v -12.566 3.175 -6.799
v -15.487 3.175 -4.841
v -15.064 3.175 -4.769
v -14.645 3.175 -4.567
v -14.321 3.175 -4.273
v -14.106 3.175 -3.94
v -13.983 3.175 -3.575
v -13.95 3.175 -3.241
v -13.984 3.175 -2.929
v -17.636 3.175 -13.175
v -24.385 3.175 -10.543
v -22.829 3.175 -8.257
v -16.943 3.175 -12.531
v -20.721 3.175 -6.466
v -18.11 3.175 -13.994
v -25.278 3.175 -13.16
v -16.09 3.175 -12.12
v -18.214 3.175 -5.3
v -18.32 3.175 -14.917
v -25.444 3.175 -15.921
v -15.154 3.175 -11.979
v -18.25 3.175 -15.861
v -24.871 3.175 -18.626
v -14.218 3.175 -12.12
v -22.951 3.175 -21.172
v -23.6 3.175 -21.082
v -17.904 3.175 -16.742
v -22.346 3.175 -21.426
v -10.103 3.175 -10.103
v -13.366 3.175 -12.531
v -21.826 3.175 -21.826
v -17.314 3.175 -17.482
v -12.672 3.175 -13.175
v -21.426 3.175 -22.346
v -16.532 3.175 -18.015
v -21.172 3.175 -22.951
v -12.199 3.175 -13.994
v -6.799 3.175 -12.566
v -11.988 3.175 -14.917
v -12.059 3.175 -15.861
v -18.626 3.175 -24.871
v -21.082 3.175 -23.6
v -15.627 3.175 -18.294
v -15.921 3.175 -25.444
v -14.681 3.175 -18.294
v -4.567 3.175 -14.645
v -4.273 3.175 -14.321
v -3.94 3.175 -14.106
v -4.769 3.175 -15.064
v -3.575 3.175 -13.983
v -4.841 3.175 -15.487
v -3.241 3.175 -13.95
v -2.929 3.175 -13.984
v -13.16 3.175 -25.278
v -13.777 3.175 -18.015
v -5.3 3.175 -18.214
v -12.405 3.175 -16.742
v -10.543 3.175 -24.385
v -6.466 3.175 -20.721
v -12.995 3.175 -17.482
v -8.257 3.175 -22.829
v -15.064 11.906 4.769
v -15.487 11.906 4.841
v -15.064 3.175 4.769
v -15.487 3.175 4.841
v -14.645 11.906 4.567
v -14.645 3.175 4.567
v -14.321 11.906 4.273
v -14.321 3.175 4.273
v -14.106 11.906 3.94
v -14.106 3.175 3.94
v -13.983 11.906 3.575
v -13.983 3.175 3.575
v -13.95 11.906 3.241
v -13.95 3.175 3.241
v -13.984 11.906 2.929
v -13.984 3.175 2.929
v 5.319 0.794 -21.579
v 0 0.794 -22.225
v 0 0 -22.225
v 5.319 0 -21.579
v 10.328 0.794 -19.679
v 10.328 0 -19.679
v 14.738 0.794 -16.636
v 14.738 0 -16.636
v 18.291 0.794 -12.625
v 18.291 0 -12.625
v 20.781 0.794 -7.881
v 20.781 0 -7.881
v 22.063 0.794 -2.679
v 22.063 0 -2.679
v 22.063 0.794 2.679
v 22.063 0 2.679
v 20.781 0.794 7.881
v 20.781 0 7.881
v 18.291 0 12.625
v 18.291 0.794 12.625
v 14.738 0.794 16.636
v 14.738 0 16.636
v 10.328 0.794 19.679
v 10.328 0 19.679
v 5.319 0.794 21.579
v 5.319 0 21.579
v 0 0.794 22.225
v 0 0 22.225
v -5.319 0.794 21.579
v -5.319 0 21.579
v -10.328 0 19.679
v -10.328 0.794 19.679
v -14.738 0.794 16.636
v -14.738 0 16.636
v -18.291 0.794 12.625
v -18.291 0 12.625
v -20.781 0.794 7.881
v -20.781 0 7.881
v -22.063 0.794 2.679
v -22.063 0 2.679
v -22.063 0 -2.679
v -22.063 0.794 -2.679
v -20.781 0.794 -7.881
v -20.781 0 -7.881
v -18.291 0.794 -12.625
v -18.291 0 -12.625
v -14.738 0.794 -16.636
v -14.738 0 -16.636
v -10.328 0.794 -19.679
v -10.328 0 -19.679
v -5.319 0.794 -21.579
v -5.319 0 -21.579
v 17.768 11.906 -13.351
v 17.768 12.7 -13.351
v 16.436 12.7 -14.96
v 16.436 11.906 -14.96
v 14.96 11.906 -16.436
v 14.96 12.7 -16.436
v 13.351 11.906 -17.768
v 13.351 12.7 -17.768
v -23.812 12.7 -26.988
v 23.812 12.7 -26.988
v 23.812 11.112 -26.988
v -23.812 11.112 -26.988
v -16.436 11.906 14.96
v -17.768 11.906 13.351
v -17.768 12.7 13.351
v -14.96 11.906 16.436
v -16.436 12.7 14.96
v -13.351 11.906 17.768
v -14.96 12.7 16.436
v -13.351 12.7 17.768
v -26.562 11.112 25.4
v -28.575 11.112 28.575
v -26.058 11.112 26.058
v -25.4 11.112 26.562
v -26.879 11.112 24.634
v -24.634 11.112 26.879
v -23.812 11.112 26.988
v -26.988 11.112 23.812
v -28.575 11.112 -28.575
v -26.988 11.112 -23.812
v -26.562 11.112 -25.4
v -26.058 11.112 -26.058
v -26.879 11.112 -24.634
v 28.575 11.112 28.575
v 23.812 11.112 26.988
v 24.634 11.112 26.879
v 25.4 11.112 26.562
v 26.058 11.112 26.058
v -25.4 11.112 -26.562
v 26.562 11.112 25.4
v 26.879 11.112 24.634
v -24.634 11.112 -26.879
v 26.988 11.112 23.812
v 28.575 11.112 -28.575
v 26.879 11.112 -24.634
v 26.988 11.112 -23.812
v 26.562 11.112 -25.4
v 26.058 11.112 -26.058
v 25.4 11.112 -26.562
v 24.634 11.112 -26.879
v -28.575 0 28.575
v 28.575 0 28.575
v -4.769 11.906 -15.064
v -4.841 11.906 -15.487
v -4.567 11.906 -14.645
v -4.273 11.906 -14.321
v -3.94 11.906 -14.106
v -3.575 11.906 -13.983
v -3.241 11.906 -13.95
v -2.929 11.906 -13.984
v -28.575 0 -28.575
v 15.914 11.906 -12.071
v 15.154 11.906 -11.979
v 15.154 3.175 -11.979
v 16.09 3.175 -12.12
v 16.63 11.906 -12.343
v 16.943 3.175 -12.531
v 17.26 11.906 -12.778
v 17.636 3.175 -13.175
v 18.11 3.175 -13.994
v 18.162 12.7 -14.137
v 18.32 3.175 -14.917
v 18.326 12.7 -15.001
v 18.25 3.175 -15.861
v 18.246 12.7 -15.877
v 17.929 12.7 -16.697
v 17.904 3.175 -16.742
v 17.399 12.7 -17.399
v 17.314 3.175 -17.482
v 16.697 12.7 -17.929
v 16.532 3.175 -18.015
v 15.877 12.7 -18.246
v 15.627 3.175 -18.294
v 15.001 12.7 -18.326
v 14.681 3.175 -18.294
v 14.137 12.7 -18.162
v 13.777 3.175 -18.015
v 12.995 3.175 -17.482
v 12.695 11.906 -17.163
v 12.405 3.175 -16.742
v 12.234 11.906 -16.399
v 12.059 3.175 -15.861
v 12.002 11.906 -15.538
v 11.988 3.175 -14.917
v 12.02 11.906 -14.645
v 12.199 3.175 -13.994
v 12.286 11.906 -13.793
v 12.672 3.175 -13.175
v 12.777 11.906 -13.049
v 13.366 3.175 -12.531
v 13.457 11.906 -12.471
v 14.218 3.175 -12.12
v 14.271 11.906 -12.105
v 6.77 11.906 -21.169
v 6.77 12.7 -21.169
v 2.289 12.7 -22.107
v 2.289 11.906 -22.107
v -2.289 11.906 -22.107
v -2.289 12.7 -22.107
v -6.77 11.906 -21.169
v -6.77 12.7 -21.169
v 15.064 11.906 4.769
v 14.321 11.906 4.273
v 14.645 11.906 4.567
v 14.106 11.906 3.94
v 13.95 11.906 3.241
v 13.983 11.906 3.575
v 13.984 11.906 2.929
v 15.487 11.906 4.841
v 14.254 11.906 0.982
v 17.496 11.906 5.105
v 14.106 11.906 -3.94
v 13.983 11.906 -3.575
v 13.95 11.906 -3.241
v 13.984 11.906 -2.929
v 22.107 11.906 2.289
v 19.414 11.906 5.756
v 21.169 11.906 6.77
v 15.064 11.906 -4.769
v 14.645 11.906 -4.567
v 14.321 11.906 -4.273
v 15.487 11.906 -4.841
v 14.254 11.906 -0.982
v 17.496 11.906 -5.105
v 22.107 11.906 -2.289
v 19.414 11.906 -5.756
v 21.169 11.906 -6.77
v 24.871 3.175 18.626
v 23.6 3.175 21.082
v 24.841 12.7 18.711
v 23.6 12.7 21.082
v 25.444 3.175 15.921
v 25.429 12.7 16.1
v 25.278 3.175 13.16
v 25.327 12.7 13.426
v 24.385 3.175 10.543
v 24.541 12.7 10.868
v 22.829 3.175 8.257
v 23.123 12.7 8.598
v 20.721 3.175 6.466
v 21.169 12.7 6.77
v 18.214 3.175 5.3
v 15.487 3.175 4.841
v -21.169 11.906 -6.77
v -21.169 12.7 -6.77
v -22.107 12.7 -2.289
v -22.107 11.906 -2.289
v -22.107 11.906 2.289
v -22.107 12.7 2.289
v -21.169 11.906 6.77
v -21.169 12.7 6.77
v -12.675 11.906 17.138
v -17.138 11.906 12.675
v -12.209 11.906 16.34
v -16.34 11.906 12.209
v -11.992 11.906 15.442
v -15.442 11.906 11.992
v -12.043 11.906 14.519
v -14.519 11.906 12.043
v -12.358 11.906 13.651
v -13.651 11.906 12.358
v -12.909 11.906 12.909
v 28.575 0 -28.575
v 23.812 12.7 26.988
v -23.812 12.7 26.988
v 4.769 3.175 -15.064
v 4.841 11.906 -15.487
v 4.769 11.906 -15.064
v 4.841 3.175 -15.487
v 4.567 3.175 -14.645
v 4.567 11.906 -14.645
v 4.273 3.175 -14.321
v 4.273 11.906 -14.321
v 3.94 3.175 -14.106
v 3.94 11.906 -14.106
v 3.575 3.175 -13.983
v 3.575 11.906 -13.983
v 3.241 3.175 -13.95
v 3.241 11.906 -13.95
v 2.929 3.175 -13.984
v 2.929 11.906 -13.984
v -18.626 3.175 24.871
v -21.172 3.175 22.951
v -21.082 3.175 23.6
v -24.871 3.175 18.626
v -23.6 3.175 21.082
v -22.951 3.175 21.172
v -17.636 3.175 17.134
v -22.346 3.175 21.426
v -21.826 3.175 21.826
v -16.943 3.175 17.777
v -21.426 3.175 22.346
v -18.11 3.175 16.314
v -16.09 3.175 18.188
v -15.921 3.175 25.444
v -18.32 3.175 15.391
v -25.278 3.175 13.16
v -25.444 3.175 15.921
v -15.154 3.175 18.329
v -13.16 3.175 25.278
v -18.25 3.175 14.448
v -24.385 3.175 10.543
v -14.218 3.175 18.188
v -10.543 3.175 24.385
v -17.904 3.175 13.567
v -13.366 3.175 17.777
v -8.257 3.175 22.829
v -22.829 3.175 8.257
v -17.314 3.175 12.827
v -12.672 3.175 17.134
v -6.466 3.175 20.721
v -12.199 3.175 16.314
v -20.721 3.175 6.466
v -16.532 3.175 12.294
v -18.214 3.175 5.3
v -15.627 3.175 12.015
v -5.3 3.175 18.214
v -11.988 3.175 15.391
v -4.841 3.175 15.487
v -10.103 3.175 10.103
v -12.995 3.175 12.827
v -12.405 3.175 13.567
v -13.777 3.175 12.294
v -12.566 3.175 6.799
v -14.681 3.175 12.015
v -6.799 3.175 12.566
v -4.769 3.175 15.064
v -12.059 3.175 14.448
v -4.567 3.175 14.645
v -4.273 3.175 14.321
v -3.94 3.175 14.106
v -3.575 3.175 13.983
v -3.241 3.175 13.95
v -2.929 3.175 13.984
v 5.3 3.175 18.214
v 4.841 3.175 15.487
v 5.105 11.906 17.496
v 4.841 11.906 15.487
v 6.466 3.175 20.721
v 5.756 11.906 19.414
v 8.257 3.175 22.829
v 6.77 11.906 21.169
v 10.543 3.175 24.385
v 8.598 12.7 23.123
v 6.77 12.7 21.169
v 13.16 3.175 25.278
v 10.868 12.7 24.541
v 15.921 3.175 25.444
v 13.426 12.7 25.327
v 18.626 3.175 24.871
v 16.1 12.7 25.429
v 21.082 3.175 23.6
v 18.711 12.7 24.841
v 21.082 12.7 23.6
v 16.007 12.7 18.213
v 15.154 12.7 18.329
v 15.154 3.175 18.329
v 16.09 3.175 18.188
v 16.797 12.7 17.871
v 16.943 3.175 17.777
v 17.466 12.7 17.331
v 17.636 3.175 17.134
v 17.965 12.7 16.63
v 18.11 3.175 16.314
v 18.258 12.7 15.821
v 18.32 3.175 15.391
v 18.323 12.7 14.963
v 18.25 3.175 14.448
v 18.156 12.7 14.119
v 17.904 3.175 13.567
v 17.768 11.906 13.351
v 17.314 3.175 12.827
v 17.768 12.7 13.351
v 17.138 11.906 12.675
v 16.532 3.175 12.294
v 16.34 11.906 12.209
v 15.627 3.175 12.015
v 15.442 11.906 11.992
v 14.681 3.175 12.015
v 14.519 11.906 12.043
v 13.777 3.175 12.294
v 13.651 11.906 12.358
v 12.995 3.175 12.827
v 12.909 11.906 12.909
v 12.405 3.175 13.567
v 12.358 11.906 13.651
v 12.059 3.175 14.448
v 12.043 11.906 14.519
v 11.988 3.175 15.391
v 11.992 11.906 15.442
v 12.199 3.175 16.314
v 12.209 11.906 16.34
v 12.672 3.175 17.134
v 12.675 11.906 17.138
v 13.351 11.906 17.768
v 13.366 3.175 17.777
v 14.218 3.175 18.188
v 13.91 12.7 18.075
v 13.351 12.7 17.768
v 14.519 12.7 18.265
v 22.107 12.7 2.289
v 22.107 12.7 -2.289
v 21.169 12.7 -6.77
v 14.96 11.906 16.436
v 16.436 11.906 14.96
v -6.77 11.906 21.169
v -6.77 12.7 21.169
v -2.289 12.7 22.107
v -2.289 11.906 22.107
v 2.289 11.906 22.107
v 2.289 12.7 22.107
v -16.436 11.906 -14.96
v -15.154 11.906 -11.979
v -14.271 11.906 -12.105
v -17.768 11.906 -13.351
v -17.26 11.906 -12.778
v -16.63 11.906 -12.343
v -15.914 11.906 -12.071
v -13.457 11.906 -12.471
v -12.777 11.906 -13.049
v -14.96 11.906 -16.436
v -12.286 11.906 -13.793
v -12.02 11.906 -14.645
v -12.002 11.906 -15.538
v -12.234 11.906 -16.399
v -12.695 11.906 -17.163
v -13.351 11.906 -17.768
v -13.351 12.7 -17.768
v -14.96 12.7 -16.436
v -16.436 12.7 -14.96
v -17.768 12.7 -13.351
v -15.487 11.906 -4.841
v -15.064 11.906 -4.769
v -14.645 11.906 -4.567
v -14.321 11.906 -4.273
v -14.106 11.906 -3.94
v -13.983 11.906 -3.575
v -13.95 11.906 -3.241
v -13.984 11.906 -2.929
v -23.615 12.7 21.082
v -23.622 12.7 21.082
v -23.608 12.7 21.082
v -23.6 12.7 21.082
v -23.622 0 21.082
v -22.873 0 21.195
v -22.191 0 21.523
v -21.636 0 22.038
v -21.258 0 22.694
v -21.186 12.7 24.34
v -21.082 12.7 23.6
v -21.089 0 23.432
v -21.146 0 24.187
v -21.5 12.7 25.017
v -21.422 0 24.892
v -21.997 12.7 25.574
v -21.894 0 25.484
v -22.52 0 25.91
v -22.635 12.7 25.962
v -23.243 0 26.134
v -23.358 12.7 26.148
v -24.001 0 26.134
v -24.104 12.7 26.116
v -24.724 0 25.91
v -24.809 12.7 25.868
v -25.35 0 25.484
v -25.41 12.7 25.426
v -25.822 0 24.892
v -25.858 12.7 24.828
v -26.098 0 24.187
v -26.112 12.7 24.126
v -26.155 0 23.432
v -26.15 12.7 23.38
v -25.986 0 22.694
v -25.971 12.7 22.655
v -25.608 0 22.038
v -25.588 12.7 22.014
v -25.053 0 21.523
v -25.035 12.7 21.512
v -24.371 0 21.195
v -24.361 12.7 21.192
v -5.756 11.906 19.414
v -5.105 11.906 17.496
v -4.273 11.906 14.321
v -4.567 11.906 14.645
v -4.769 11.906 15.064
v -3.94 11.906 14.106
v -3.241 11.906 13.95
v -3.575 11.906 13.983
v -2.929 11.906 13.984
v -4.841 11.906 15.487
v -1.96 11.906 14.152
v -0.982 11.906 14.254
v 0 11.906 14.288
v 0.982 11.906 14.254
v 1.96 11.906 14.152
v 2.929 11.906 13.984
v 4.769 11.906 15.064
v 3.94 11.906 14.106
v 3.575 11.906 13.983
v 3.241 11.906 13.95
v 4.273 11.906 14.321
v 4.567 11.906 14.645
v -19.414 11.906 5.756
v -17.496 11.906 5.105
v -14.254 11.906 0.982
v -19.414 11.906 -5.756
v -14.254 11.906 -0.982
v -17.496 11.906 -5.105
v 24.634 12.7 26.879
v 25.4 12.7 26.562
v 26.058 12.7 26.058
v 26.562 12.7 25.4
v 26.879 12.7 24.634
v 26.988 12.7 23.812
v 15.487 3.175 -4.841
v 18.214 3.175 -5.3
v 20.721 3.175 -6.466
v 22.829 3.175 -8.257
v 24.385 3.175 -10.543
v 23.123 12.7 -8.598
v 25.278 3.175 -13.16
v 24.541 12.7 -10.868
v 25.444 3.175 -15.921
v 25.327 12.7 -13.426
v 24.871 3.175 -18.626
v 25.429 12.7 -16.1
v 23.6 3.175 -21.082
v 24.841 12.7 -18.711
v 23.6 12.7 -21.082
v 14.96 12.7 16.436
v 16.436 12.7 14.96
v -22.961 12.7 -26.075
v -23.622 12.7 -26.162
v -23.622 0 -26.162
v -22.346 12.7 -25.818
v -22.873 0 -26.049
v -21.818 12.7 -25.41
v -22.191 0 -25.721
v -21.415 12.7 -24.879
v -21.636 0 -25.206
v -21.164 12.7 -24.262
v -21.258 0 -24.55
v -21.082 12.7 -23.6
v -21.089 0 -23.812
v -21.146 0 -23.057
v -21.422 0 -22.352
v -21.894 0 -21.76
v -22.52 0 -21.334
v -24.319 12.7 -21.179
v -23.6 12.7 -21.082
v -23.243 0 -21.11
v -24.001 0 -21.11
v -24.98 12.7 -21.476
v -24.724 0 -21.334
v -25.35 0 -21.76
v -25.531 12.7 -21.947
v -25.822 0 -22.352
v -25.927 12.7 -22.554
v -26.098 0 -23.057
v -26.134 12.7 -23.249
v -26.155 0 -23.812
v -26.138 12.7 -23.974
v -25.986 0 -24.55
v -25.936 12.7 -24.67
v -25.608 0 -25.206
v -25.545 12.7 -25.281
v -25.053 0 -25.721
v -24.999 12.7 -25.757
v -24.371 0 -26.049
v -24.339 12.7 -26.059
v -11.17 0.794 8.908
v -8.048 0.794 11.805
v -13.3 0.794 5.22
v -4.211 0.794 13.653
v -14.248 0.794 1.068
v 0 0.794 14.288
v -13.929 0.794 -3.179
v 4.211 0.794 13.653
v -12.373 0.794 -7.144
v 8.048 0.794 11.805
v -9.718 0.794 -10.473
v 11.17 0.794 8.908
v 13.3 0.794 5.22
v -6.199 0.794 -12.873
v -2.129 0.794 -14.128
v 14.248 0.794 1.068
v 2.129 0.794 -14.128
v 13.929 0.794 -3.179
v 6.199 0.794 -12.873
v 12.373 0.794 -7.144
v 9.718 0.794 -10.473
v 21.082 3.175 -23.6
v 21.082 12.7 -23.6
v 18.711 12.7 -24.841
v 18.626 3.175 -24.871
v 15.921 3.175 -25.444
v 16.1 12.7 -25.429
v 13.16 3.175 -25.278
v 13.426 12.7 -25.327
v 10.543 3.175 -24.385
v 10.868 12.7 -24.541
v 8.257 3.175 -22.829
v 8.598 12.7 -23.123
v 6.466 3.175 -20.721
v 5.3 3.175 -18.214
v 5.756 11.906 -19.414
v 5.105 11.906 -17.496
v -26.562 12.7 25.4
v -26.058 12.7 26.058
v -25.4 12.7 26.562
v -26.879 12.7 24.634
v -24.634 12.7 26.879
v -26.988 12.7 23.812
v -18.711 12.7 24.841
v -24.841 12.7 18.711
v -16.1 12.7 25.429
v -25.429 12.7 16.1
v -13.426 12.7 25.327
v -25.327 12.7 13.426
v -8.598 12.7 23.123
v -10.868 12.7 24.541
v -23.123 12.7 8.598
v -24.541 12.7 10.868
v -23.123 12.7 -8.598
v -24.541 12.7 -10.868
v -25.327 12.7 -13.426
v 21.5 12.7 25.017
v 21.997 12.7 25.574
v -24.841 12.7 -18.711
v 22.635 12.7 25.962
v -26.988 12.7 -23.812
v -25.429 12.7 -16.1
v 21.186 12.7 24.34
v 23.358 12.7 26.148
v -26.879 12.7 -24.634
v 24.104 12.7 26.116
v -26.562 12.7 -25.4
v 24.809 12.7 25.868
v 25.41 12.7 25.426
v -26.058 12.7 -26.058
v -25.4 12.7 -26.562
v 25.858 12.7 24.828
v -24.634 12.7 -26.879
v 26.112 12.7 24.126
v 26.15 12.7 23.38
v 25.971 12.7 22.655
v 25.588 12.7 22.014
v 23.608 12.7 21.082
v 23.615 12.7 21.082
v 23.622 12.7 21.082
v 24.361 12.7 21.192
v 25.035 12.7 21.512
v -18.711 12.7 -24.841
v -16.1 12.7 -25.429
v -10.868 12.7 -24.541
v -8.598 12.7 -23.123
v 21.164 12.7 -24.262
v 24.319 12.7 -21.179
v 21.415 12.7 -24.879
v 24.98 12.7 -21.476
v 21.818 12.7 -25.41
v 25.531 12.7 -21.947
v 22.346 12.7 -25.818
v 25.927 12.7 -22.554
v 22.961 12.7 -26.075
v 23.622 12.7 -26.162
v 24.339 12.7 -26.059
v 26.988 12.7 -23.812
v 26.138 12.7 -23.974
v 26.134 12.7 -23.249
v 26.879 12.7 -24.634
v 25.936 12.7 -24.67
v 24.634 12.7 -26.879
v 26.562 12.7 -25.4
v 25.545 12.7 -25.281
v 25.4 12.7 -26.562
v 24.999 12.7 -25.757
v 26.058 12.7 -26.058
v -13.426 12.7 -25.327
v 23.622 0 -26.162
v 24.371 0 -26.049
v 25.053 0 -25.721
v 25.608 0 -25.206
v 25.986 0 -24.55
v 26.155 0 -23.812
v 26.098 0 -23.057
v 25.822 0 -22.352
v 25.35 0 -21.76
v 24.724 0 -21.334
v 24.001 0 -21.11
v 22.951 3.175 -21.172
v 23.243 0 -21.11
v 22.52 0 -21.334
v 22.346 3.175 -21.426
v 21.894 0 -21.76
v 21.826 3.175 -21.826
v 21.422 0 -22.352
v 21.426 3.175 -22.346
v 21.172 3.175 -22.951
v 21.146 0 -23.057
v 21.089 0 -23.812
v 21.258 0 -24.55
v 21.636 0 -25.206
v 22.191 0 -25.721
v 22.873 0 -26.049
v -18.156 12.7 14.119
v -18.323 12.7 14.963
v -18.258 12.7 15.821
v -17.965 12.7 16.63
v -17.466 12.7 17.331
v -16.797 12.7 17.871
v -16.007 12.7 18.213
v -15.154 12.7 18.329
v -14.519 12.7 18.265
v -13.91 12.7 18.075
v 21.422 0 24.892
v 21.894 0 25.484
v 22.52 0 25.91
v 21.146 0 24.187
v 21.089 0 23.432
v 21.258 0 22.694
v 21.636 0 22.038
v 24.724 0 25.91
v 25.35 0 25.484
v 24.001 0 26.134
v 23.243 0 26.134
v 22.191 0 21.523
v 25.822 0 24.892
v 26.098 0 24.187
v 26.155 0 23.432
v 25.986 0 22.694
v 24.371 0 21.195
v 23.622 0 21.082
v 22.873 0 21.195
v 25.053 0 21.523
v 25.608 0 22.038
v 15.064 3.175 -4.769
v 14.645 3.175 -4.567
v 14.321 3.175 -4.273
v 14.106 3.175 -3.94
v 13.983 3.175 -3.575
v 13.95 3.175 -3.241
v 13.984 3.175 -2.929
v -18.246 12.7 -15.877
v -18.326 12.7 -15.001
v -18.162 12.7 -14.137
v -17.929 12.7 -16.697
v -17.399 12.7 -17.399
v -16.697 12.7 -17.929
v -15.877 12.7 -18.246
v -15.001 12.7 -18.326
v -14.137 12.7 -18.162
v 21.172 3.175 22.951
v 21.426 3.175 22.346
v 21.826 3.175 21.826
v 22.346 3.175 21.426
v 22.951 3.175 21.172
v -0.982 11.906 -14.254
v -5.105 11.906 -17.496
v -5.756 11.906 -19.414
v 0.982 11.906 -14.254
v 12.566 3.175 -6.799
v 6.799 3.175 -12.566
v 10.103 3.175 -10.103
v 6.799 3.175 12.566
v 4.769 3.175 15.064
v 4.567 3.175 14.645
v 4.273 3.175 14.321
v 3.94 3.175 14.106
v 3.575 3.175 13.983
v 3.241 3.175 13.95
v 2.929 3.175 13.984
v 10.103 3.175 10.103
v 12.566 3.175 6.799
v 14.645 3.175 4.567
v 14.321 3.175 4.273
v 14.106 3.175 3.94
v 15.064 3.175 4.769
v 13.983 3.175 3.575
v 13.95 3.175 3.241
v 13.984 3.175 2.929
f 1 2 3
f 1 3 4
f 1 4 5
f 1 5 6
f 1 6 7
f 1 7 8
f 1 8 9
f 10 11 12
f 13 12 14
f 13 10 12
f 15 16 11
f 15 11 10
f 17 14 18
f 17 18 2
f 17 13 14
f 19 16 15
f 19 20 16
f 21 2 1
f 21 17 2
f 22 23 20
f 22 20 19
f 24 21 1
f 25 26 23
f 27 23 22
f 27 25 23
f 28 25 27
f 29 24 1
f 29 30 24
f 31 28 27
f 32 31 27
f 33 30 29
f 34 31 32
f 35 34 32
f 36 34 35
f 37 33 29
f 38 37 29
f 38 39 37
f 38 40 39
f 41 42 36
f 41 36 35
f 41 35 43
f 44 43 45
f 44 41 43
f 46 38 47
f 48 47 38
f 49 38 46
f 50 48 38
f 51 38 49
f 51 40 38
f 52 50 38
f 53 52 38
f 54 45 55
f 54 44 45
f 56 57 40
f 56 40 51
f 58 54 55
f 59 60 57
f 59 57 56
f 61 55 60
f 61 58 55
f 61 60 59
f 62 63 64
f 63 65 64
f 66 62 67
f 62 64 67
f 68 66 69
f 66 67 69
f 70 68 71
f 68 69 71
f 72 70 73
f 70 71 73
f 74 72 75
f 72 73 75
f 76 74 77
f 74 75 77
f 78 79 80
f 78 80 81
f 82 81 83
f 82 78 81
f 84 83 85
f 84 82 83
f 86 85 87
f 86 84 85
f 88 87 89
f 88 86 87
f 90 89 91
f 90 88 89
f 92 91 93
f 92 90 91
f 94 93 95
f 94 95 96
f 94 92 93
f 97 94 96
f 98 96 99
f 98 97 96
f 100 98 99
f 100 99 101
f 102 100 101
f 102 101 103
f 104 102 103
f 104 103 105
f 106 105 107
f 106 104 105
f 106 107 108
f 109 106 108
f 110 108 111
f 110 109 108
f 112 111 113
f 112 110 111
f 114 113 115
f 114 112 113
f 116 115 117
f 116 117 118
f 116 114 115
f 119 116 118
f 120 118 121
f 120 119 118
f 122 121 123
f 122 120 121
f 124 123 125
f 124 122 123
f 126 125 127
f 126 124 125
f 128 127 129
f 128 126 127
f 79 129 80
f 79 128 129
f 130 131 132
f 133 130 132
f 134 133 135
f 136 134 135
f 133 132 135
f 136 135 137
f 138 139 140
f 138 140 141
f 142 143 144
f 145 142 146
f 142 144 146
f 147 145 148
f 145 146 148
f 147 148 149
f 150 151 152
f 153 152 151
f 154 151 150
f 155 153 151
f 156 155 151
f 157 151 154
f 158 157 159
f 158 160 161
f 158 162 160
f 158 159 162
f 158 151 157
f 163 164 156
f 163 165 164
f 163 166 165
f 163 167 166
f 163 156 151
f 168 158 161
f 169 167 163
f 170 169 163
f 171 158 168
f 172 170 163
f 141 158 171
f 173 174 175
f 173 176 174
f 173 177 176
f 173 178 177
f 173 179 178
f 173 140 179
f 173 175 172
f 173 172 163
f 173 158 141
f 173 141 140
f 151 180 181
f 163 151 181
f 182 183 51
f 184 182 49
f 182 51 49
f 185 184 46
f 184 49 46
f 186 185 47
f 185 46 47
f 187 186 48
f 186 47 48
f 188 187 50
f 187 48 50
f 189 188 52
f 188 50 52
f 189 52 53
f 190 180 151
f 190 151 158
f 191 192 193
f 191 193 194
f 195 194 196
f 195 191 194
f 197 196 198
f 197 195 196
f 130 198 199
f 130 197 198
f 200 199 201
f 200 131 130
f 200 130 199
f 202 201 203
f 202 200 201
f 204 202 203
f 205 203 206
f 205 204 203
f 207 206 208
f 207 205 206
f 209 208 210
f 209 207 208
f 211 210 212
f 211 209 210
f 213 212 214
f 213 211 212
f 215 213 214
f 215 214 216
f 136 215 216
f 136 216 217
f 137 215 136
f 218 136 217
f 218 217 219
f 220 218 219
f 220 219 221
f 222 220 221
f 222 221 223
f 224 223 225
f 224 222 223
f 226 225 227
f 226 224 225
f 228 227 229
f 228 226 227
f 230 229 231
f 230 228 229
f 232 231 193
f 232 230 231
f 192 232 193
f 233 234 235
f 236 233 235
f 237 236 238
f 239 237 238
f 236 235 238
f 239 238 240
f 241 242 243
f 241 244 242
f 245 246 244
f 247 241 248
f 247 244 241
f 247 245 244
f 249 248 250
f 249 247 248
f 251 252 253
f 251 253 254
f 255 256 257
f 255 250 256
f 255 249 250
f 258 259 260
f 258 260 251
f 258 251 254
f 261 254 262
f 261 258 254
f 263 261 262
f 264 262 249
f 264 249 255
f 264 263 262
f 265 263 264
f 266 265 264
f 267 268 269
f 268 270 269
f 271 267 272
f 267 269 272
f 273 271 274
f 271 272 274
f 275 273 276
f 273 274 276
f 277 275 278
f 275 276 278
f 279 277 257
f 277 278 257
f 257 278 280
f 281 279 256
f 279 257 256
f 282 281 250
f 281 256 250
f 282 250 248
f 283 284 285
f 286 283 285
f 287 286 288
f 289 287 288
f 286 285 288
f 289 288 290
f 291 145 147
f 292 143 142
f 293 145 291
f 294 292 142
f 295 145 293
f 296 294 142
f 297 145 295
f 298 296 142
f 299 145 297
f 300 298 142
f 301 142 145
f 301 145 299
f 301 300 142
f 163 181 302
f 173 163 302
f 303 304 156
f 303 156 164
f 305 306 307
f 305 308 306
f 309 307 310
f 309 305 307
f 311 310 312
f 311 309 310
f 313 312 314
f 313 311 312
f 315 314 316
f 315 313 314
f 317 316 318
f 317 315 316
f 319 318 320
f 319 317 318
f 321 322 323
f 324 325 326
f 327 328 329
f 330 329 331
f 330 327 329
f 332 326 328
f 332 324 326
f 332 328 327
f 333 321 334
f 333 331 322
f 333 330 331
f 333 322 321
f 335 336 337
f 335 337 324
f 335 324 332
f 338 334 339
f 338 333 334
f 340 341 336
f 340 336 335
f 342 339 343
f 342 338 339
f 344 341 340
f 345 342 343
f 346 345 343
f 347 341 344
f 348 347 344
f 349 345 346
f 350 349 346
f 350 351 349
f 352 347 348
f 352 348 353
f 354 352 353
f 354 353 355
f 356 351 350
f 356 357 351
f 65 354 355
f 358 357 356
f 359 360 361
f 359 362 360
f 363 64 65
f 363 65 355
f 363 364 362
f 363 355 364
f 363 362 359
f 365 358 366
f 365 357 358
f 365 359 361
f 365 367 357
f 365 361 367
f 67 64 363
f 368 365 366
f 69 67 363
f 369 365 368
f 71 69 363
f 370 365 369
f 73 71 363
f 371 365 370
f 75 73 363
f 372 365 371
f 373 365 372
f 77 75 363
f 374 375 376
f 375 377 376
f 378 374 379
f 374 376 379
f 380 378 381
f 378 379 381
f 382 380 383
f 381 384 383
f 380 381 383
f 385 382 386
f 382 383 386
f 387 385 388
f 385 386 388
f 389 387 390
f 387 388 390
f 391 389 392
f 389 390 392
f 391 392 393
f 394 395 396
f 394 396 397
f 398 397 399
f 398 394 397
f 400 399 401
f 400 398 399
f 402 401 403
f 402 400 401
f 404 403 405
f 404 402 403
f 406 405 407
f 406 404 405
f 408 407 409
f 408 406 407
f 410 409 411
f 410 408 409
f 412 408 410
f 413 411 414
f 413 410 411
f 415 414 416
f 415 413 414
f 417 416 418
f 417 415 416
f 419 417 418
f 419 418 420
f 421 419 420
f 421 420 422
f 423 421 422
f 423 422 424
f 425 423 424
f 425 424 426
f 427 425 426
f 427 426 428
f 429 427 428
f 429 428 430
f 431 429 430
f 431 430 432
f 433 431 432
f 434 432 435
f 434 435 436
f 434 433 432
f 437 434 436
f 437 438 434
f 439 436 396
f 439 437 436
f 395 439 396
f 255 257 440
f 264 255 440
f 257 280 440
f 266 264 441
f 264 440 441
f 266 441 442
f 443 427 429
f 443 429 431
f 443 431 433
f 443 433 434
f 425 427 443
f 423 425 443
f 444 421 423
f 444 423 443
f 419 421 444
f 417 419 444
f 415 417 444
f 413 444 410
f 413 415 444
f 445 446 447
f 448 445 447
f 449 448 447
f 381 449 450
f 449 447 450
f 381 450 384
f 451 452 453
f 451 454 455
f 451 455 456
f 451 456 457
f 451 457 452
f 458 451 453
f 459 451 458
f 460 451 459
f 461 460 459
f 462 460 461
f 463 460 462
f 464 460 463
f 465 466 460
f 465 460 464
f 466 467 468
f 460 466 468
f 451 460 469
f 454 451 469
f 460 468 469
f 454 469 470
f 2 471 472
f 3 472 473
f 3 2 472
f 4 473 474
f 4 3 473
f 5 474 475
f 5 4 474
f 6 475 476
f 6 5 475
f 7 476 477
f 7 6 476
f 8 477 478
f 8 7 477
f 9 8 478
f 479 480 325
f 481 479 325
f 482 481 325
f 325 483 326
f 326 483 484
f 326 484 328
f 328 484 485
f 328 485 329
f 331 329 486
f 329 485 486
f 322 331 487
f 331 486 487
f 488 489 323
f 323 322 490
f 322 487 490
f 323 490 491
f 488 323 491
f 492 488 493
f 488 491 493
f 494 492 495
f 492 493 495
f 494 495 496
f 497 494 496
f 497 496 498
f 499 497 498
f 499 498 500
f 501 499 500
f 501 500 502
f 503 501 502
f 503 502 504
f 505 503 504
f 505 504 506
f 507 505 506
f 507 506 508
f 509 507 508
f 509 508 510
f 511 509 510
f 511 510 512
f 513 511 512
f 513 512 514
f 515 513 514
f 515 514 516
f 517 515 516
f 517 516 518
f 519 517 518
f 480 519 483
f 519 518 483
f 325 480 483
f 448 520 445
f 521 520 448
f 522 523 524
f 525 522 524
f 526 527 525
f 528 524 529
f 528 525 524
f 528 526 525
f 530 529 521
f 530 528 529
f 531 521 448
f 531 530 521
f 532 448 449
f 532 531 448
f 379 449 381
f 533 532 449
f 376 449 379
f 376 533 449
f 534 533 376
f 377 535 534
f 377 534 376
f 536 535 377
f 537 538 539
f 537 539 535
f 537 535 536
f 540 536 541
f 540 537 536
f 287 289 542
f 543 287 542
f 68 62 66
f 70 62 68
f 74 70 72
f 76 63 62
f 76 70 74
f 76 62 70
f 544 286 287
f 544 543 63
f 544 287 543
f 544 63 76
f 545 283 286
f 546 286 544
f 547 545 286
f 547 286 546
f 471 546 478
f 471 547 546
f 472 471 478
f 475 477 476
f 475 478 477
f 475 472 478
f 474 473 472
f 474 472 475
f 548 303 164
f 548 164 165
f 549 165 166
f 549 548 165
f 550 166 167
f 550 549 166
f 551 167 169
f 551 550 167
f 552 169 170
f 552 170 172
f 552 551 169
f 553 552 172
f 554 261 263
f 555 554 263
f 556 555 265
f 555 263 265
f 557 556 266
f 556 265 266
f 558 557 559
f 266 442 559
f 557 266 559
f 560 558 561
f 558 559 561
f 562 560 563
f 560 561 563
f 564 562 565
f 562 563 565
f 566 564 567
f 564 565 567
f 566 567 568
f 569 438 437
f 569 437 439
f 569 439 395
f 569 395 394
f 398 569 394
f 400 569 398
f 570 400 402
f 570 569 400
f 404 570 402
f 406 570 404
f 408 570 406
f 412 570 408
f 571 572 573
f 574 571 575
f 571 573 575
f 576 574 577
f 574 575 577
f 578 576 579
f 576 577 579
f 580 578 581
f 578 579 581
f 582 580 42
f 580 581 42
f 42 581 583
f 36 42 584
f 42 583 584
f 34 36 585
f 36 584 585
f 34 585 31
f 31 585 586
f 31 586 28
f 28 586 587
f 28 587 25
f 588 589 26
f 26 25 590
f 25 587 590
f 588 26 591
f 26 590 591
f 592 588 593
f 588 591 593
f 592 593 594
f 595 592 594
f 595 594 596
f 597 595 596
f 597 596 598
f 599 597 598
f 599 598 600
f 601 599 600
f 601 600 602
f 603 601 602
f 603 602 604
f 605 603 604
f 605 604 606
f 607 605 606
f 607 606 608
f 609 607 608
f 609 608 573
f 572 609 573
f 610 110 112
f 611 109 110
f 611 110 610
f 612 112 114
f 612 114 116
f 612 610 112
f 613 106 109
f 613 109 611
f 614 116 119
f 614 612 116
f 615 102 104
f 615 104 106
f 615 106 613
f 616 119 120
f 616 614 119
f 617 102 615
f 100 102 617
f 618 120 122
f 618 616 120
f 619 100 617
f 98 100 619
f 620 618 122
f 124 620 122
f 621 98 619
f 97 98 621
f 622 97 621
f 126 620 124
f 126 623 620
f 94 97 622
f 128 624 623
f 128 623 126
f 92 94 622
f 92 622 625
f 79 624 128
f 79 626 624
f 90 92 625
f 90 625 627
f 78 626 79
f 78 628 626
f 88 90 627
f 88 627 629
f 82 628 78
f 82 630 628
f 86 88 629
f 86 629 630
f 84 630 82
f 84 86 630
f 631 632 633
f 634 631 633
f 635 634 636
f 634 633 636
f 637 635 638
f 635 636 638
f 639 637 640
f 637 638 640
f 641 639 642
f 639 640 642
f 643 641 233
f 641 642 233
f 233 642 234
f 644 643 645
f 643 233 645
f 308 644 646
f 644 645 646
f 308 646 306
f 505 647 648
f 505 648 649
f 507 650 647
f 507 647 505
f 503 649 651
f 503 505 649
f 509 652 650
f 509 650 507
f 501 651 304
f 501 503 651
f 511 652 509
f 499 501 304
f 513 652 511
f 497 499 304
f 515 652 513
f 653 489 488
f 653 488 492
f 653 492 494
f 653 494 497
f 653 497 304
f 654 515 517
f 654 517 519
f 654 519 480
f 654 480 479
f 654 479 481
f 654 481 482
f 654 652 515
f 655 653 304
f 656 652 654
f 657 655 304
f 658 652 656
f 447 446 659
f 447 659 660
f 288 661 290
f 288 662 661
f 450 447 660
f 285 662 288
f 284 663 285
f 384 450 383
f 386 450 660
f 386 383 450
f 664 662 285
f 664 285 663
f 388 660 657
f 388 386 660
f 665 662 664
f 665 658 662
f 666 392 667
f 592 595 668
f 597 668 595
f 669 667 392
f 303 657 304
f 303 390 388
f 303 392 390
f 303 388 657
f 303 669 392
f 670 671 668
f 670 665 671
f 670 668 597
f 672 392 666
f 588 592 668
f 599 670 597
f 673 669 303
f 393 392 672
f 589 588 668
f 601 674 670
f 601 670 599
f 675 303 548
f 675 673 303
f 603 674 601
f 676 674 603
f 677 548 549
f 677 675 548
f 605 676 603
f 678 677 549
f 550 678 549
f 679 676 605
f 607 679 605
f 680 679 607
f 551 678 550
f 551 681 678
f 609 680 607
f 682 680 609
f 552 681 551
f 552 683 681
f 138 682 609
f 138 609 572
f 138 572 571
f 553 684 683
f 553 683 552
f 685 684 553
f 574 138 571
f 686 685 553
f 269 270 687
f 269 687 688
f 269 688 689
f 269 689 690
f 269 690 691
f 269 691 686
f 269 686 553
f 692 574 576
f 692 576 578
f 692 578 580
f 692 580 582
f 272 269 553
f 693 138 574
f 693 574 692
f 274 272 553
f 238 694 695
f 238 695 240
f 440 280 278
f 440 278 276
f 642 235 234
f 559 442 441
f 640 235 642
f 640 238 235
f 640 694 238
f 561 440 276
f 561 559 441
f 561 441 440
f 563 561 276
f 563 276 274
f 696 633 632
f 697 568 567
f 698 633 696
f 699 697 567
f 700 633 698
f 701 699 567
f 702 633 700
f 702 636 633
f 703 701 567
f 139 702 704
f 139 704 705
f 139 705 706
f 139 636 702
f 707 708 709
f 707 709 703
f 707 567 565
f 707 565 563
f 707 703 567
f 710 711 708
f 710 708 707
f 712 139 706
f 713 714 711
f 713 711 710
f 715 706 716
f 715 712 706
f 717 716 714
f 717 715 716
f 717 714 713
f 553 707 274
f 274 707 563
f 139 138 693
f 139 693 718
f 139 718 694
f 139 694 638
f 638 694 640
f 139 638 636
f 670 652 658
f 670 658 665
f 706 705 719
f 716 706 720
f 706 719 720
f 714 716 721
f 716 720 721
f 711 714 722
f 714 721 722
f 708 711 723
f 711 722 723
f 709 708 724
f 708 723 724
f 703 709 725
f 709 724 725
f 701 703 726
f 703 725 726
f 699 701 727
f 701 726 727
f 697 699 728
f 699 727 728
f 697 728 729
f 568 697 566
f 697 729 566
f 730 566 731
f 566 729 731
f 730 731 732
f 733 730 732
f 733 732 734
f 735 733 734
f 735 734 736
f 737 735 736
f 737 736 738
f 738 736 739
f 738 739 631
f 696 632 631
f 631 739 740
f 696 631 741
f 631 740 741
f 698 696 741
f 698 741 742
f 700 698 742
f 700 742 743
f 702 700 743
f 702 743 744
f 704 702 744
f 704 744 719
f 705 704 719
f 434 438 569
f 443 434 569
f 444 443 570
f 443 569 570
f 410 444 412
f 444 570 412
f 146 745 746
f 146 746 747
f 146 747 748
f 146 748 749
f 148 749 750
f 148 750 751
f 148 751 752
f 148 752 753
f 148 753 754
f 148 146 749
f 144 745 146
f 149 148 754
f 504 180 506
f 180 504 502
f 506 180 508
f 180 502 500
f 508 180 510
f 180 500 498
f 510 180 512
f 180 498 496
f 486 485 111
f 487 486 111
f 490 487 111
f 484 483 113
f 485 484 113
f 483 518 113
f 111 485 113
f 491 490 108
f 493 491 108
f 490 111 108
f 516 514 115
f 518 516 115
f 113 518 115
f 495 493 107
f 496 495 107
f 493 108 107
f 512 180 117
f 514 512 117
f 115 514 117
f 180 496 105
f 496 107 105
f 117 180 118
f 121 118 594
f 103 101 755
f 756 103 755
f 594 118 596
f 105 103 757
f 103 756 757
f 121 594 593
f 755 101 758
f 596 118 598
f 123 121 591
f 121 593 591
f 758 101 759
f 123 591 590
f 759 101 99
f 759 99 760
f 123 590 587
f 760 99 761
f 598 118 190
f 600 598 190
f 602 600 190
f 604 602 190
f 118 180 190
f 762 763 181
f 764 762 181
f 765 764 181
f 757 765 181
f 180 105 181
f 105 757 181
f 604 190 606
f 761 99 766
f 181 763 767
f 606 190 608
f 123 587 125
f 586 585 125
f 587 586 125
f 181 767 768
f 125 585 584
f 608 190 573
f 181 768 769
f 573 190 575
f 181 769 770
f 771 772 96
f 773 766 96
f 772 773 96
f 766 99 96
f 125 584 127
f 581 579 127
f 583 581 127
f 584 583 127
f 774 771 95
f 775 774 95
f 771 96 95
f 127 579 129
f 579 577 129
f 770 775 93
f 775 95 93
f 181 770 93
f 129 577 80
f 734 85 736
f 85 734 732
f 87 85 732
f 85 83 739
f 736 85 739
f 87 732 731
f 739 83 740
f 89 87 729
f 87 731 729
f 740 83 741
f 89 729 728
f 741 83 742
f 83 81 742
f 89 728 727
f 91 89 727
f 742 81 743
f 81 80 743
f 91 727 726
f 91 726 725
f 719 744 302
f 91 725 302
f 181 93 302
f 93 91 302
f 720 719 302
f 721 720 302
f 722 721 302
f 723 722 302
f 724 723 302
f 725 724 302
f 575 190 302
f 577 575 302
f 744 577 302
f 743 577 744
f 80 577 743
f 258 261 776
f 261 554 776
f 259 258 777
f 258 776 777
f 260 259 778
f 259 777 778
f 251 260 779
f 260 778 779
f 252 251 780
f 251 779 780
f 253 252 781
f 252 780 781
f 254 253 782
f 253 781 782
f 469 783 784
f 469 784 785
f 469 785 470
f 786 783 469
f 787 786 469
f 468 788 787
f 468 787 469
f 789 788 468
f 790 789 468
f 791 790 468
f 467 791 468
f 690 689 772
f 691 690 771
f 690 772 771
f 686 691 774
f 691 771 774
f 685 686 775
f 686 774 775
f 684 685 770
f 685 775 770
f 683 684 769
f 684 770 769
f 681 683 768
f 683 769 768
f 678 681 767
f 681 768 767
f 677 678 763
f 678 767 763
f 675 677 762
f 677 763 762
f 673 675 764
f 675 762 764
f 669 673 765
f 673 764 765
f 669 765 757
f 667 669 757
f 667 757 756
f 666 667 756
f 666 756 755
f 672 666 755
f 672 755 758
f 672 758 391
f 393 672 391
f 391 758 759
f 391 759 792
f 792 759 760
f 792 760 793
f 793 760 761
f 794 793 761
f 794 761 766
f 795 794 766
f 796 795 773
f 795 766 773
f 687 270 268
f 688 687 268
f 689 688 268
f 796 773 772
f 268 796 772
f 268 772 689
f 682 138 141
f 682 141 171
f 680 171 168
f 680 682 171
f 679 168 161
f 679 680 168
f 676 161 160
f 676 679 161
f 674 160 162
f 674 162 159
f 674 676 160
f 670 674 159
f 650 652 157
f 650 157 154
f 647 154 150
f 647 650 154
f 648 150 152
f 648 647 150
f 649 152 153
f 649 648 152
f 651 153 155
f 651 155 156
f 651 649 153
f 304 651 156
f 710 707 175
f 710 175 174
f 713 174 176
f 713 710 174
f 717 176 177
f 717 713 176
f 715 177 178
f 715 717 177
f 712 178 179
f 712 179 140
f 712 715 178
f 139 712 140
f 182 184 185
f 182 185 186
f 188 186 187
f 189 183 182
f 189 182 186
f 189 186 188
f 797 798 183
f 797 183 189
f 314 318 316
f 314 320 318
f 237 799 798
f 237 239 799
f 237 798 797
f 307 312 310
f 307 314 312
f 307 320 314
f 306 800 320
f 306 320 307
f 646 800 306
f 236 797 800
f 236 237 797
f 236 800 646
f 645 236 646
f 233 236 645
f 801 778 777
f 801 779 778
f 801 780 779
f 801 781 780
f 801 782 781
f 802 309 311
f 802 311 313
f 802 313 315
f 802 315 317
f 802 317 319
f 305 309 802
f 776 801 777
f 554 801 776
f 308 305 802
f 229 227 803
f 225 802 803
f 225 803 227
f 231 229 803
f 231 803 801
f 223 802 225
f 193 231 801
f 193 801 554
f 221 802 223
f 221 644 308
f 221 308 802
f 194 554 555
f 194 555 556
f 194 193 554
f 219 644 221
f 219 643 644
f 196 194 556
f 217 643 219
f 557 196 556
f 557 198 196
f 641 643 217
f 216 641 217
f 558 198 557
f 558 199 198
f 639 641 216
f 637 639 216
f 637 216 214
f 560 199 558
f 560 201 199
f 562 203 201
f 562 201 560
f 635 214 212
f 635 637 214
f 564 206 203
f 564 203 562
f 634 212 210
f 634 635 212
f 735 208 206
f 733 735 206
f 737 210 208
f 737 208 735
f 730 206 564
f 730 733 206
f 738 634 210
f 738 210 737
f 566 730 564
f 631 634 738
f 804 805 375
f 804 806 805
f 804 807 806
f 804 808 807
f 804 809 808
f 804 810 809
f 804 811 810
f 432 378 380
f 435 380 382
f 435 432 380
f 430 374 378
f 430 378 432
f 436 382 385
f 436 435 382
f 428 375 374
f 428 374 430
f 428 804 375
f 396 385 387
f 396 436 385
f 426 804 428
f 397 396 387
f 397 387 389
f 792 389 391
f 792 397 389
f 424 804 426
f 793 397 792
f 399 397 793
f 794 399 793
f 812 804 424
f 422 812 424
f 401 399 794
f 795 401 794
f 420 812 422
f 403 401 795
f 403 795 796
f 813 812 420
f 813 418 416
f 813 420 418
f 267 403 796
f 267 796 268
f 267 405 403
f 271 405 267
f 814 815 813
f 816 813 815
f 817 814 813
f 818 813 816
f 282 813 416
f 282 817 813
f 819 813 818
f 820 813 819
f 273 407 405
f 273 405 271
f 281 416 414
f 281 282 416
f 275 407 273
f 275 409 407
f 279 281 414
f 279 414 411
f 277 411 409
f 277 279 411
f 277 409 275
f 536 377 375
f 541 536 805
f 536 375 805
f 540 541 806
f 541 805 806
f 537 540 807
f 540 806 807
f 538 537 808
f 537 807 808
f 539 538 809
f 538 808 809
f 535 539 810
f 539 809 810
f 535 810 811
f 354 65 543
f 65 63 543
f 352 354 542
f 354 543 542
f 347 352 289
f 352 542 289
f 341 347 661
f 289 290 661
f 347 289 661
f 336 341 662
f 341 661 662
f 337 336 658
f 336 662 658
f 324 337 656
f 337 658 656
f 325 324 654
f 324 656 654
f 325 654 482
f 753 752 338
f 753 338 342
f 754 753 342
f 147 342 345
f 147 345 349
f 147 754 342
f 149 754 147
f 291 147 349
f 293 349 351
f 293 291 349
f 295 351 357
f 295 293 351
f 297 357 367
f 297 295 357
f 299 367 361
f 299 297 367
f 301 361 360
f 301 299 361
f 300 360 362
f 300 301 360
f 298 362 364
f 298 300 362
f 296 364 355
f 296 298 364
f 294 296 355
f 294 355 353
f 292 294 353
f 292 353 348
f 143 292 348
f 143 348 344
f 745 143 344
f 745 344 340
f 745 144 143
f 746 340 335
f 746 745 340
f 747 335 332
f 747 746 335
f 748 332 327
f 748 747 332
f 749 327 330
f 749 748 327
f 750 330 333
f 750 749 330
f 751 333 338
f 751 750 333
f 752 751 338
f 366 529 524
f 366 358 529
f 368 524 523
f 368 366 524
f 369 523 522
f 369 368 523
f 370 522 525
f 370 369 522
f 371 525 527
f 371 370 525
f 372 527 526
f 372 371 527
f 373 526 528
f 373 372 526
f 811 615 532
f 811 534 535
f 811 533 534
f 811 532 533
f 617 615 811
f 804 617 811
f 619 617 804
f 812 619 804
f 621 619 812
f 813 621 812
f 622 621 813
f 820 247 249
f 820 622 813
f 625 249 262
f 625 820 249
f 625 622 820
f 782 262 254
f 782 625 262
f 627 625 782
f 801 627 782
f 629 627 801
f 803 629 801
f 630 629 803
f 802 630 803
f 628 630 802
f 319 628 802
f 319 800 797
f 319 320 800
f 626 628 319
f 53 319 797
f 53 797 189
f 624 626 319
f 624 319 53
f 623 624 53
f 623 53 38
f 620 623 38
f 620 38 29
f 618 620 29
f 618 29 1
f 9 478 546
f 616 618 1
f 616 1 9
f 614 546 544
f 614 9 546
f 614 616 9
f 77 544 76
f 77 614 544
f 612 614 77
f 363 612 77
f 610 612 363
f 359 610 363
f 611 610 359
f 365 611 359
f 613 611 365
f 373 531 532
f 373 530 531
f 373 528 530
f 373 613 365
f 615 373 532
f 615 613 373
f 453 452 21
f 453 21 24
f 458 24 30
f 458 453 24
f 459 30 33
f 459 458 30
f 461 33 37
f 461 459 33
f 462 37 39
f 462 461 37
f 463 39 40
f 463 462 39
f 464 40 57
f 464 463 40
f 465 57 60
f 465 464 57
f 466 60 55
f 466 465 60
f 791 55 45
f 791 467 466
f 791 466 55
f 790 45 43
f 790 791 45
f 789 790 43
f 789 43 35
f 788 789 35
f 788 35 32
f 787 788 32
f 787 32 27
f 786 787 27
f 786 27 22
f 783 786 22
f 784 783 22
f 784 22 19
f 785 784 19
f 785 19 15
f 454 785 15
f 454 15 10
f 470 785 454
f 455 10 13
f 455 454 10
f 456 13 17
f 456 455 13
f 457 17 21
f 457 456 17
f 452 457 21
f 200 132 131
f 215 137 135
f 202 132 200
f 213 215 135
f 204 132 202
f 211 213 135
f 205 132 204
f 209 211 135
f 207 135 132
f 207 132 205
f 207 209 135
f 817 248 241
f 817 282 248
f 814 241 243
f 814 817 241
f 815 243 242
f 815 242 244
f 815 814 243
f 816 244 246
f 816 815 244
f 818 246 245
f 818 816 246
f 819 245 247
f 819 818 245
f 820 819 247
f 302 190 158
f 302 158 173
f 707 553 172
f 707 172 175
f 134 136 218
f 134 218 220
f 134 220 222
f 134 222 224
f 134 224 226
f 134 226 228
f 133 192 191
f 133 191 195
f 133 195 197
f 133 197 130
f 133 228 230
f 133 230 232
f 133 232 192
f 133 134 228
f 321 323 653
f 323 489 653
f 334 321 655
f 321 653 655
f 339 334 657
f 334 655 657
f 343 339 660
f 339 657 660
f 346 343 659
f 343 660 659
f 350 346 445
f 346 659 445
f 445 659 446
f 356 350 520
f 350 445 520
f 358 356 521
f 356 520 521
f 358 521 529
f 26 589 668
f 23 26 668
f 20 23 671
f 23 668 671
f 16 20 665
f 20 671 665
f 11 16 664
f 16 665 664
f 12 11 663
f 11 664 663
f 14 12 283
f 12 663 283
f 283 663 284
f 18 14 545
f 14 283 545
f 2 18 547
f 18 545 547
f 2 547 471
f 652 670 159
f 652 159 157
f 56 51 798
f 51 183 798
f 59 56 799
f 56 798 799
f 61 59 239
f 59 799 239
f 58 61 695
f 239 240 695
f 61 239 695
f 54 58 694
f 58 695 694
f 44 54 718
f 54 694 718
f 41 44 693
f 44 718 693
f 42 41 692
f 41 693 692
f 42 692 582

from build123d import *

# Parameters (mm, degrees)
SKETCH1_W          = 57.15
SKETCH1_H          = 57.15
SKETCH1_R          = 14.2875
STOCK_DEPTH        = 12.7
SKETCH6_R          = 2.54
MOUNT_HOLES_DEPTH  = 43.359783404
SKETCH2_W          = 57.15
SKETCH2_H          = 57.15
LIP_DEPTH          = 1.5875
SKETCH4_R          = 10.31875
SKETCH4_R_2        = 3.175
BEARING_CUTS_DEPTH = 9.525
SKETCH5_R          = 22.225
INNER_RACE_DEPTH   = 0.79375
OUTER_START        = -0.79375
SKETCH8_R          = 22.225
OUTER_RACE_DEPTH   = 0.79375
FILLET1_R          = 1.5875


with BuildPart() as part:
    # Sketch1 → Stock (new body)
    with BuildSketch(Plane(origin=(0, 0, 0), x_dir=(1, 0, 0), z_dir=(0, 1, 0))):
        Rectangle(SKETCH1_W, SKETCH1_H)
        with Locations(Location((0, 0, 0), (0, 0, 270))):
            Circle(SKETCH1_R, mode=Mode.SUBTRACT)
    extrude(amount=STOCK_DEPTH)

    # Sketch6 → Mount Holes (cut, through all)
    with BuildSketch(Plane.XZ):
        with Locations(Location((-23.622, 23.622, 0), (0, 0, 270))):
            Circle(SKETCH6_R)
        with Locations(Location((23.622, 23.622, 0), (0, 0, 270))):
            Circle(SKETCH6_R)
        with Locations(Location((23.622, -23.622, 0), (0, 0, 270))):
            Circle(SKETCH6_R)
        with Locations(Location((-23.622, -23.622, 0), (0, 0, 270))):
            Circle(SKETCH6_R)
    extrude(amount=-MOUNT_HOLES_DEPTH, mode=Mode.SUBTRACT)

    # Sketch2 → Lip (cut)
    with BuildSketch(Plane(origin=(0, 12.7, 0), x_dir=(1, 0, 0), z_dir=(0, 1, 0))):
        Rectangle(SKETCH2_W, SKETCH2_H)
        with BuildLine():
            Line((-23.8125, -26.9875), (23.8125, -26.9875))
            ThreePointArc((23.8125, -26.9875), (26.05756403, -26.05756403), (26.9875, -23.8125))
            Line((26.9875, -23.8125), (26.9875, 23.8125))
            ThreePointArc((26.9875, 23.8125), (26.05756403, 26.05756403), (23.8125, 26.9875))
            Line((23.8125, 26.9875), (-23.8125, 26.9875))
            ThreePointArc((-23.8125, 26.9875), (-26.05756403, 26.05756403), (-26.9875, 23.8125))
            Line((-26.9875, 23.8125), (-26.9875, -23.8125))
            ThreePointArc((-26.9875, -23.8125), (-26.05756403, -26.05756403), (-23.8125, -26.9875))
        make_face(mode=Mode.SUBTRACT)
    extrude(amount=-LIP_DEPTH, mode=Mode.SUBTRACT)

    # Sketch4 → Bearing Cuts (cut)
    # profile 1 of 4: a face of its own
    with BuildSketch(Plane(origin=(0, 12.7, 0), x_dir=(1, 0, 0), z_dir=(0, 1, 0))):
        with Locations((15.154182204, 15.154182204)):
            Circle(SKETCH4_R)
        with Locations(Location((15.154182204, 15.154182204, 0), (0, 0, 270))):
            Circle(SKETCH4_R_2, mode=Mode.SUBTRACT)
    # profile 2 of 4: a face of its own
    with BuildSketch(Plane(origin=(0, 12.7, 0), x_dir=(1, 0, 0), z_dir=(0, 1, 0))):
        with Locations((15.154182204, -15.154182204)):
            Circle(SKETCH4_R)
        with Locations(Location((15.154182204, -15.154182204, 0), (0, 0, 270))):
            Circle(SKETCH4_R_2, mode=Mode.SUBTRACT)
    # profile 3 of 4: a face of its own
    with BuildSketch(Plane(origin=(0, 12.7, 0), x_dir=(1, 0, 0), z_dir=(0, 1, 0))):
        with Locations((-15.154182204, -15.154182204)):
            Circle(SKETCH4_R)
        with Locations(Location((-15.154182204, -15.154182204, 0), (0, 0, 270))):
            Circle(SKETCH4_R_2, mode=Mode.SUBTRACT)
    # profile 4 of 4: a face of its own
    with BuildSketch(Plane(origin=(0, 12.7, 0), x_dir=(1, 0, 0), z_dir=(0, 1, 0))):
        with Locations((-15.154182204, 15.154182204)):
            Circle(SKETCH4_R)
        with Locations(Location((-15.154182204, 15.154182204, 0), (0, 0, 270))):
            Circle(SKETCH4_R_2, mode=Mode.SUBTRACT)
    extrude(amount=-BEARING_CUTS_DEPTH, mode=Mode.SUBTRACT)

    # Sketch5 → Inner Race (cut)
    with BuildSketch(Plane(origin=(0, 12.7, 0), x_dir=(1, 0, 0), z_dir=(0, 1, 0))):
        Circle(SKETCH5_R)
    extrude(amount=-INNER_RACE_DEPTH, mode=Mode.SUBTRACT)

    # Sketch8 → Outer Race (cut)
    with BuildSketch(Plane.XZ.offset(OUTER_START)):
        with Locations(Location((0, 0, 0), (0, 0, 270))):
            Circle(SKETCH8_R)
    extrude(amount=OUTER_RACE_DEPTH, mode=Mode.SUBTRACT)

    # Fillet1
    fillet1_edges = [part.edges().sort_by_distance(p)[0] for p in [
        (-13.388674142, 7.540625, 4.987590699),
        (-4.987590699, 7.540625, -13.388674142),
        (-13.388674142, 7.540625, -4.987590699),
        (-4.987590699, 7.540625, 13.388674142),
        (13.388674142, 7.540625, 4.987590699),
        (4.987590699, 7.540625, -13.388674142),
        (13.388674142, 7.540625, -4.987590699),
        (4.987590699, 7.540625, 13.388674142),
    ]]
    fillet(fillet1_edges, radius=FILLET1_R)


solid = part.part
